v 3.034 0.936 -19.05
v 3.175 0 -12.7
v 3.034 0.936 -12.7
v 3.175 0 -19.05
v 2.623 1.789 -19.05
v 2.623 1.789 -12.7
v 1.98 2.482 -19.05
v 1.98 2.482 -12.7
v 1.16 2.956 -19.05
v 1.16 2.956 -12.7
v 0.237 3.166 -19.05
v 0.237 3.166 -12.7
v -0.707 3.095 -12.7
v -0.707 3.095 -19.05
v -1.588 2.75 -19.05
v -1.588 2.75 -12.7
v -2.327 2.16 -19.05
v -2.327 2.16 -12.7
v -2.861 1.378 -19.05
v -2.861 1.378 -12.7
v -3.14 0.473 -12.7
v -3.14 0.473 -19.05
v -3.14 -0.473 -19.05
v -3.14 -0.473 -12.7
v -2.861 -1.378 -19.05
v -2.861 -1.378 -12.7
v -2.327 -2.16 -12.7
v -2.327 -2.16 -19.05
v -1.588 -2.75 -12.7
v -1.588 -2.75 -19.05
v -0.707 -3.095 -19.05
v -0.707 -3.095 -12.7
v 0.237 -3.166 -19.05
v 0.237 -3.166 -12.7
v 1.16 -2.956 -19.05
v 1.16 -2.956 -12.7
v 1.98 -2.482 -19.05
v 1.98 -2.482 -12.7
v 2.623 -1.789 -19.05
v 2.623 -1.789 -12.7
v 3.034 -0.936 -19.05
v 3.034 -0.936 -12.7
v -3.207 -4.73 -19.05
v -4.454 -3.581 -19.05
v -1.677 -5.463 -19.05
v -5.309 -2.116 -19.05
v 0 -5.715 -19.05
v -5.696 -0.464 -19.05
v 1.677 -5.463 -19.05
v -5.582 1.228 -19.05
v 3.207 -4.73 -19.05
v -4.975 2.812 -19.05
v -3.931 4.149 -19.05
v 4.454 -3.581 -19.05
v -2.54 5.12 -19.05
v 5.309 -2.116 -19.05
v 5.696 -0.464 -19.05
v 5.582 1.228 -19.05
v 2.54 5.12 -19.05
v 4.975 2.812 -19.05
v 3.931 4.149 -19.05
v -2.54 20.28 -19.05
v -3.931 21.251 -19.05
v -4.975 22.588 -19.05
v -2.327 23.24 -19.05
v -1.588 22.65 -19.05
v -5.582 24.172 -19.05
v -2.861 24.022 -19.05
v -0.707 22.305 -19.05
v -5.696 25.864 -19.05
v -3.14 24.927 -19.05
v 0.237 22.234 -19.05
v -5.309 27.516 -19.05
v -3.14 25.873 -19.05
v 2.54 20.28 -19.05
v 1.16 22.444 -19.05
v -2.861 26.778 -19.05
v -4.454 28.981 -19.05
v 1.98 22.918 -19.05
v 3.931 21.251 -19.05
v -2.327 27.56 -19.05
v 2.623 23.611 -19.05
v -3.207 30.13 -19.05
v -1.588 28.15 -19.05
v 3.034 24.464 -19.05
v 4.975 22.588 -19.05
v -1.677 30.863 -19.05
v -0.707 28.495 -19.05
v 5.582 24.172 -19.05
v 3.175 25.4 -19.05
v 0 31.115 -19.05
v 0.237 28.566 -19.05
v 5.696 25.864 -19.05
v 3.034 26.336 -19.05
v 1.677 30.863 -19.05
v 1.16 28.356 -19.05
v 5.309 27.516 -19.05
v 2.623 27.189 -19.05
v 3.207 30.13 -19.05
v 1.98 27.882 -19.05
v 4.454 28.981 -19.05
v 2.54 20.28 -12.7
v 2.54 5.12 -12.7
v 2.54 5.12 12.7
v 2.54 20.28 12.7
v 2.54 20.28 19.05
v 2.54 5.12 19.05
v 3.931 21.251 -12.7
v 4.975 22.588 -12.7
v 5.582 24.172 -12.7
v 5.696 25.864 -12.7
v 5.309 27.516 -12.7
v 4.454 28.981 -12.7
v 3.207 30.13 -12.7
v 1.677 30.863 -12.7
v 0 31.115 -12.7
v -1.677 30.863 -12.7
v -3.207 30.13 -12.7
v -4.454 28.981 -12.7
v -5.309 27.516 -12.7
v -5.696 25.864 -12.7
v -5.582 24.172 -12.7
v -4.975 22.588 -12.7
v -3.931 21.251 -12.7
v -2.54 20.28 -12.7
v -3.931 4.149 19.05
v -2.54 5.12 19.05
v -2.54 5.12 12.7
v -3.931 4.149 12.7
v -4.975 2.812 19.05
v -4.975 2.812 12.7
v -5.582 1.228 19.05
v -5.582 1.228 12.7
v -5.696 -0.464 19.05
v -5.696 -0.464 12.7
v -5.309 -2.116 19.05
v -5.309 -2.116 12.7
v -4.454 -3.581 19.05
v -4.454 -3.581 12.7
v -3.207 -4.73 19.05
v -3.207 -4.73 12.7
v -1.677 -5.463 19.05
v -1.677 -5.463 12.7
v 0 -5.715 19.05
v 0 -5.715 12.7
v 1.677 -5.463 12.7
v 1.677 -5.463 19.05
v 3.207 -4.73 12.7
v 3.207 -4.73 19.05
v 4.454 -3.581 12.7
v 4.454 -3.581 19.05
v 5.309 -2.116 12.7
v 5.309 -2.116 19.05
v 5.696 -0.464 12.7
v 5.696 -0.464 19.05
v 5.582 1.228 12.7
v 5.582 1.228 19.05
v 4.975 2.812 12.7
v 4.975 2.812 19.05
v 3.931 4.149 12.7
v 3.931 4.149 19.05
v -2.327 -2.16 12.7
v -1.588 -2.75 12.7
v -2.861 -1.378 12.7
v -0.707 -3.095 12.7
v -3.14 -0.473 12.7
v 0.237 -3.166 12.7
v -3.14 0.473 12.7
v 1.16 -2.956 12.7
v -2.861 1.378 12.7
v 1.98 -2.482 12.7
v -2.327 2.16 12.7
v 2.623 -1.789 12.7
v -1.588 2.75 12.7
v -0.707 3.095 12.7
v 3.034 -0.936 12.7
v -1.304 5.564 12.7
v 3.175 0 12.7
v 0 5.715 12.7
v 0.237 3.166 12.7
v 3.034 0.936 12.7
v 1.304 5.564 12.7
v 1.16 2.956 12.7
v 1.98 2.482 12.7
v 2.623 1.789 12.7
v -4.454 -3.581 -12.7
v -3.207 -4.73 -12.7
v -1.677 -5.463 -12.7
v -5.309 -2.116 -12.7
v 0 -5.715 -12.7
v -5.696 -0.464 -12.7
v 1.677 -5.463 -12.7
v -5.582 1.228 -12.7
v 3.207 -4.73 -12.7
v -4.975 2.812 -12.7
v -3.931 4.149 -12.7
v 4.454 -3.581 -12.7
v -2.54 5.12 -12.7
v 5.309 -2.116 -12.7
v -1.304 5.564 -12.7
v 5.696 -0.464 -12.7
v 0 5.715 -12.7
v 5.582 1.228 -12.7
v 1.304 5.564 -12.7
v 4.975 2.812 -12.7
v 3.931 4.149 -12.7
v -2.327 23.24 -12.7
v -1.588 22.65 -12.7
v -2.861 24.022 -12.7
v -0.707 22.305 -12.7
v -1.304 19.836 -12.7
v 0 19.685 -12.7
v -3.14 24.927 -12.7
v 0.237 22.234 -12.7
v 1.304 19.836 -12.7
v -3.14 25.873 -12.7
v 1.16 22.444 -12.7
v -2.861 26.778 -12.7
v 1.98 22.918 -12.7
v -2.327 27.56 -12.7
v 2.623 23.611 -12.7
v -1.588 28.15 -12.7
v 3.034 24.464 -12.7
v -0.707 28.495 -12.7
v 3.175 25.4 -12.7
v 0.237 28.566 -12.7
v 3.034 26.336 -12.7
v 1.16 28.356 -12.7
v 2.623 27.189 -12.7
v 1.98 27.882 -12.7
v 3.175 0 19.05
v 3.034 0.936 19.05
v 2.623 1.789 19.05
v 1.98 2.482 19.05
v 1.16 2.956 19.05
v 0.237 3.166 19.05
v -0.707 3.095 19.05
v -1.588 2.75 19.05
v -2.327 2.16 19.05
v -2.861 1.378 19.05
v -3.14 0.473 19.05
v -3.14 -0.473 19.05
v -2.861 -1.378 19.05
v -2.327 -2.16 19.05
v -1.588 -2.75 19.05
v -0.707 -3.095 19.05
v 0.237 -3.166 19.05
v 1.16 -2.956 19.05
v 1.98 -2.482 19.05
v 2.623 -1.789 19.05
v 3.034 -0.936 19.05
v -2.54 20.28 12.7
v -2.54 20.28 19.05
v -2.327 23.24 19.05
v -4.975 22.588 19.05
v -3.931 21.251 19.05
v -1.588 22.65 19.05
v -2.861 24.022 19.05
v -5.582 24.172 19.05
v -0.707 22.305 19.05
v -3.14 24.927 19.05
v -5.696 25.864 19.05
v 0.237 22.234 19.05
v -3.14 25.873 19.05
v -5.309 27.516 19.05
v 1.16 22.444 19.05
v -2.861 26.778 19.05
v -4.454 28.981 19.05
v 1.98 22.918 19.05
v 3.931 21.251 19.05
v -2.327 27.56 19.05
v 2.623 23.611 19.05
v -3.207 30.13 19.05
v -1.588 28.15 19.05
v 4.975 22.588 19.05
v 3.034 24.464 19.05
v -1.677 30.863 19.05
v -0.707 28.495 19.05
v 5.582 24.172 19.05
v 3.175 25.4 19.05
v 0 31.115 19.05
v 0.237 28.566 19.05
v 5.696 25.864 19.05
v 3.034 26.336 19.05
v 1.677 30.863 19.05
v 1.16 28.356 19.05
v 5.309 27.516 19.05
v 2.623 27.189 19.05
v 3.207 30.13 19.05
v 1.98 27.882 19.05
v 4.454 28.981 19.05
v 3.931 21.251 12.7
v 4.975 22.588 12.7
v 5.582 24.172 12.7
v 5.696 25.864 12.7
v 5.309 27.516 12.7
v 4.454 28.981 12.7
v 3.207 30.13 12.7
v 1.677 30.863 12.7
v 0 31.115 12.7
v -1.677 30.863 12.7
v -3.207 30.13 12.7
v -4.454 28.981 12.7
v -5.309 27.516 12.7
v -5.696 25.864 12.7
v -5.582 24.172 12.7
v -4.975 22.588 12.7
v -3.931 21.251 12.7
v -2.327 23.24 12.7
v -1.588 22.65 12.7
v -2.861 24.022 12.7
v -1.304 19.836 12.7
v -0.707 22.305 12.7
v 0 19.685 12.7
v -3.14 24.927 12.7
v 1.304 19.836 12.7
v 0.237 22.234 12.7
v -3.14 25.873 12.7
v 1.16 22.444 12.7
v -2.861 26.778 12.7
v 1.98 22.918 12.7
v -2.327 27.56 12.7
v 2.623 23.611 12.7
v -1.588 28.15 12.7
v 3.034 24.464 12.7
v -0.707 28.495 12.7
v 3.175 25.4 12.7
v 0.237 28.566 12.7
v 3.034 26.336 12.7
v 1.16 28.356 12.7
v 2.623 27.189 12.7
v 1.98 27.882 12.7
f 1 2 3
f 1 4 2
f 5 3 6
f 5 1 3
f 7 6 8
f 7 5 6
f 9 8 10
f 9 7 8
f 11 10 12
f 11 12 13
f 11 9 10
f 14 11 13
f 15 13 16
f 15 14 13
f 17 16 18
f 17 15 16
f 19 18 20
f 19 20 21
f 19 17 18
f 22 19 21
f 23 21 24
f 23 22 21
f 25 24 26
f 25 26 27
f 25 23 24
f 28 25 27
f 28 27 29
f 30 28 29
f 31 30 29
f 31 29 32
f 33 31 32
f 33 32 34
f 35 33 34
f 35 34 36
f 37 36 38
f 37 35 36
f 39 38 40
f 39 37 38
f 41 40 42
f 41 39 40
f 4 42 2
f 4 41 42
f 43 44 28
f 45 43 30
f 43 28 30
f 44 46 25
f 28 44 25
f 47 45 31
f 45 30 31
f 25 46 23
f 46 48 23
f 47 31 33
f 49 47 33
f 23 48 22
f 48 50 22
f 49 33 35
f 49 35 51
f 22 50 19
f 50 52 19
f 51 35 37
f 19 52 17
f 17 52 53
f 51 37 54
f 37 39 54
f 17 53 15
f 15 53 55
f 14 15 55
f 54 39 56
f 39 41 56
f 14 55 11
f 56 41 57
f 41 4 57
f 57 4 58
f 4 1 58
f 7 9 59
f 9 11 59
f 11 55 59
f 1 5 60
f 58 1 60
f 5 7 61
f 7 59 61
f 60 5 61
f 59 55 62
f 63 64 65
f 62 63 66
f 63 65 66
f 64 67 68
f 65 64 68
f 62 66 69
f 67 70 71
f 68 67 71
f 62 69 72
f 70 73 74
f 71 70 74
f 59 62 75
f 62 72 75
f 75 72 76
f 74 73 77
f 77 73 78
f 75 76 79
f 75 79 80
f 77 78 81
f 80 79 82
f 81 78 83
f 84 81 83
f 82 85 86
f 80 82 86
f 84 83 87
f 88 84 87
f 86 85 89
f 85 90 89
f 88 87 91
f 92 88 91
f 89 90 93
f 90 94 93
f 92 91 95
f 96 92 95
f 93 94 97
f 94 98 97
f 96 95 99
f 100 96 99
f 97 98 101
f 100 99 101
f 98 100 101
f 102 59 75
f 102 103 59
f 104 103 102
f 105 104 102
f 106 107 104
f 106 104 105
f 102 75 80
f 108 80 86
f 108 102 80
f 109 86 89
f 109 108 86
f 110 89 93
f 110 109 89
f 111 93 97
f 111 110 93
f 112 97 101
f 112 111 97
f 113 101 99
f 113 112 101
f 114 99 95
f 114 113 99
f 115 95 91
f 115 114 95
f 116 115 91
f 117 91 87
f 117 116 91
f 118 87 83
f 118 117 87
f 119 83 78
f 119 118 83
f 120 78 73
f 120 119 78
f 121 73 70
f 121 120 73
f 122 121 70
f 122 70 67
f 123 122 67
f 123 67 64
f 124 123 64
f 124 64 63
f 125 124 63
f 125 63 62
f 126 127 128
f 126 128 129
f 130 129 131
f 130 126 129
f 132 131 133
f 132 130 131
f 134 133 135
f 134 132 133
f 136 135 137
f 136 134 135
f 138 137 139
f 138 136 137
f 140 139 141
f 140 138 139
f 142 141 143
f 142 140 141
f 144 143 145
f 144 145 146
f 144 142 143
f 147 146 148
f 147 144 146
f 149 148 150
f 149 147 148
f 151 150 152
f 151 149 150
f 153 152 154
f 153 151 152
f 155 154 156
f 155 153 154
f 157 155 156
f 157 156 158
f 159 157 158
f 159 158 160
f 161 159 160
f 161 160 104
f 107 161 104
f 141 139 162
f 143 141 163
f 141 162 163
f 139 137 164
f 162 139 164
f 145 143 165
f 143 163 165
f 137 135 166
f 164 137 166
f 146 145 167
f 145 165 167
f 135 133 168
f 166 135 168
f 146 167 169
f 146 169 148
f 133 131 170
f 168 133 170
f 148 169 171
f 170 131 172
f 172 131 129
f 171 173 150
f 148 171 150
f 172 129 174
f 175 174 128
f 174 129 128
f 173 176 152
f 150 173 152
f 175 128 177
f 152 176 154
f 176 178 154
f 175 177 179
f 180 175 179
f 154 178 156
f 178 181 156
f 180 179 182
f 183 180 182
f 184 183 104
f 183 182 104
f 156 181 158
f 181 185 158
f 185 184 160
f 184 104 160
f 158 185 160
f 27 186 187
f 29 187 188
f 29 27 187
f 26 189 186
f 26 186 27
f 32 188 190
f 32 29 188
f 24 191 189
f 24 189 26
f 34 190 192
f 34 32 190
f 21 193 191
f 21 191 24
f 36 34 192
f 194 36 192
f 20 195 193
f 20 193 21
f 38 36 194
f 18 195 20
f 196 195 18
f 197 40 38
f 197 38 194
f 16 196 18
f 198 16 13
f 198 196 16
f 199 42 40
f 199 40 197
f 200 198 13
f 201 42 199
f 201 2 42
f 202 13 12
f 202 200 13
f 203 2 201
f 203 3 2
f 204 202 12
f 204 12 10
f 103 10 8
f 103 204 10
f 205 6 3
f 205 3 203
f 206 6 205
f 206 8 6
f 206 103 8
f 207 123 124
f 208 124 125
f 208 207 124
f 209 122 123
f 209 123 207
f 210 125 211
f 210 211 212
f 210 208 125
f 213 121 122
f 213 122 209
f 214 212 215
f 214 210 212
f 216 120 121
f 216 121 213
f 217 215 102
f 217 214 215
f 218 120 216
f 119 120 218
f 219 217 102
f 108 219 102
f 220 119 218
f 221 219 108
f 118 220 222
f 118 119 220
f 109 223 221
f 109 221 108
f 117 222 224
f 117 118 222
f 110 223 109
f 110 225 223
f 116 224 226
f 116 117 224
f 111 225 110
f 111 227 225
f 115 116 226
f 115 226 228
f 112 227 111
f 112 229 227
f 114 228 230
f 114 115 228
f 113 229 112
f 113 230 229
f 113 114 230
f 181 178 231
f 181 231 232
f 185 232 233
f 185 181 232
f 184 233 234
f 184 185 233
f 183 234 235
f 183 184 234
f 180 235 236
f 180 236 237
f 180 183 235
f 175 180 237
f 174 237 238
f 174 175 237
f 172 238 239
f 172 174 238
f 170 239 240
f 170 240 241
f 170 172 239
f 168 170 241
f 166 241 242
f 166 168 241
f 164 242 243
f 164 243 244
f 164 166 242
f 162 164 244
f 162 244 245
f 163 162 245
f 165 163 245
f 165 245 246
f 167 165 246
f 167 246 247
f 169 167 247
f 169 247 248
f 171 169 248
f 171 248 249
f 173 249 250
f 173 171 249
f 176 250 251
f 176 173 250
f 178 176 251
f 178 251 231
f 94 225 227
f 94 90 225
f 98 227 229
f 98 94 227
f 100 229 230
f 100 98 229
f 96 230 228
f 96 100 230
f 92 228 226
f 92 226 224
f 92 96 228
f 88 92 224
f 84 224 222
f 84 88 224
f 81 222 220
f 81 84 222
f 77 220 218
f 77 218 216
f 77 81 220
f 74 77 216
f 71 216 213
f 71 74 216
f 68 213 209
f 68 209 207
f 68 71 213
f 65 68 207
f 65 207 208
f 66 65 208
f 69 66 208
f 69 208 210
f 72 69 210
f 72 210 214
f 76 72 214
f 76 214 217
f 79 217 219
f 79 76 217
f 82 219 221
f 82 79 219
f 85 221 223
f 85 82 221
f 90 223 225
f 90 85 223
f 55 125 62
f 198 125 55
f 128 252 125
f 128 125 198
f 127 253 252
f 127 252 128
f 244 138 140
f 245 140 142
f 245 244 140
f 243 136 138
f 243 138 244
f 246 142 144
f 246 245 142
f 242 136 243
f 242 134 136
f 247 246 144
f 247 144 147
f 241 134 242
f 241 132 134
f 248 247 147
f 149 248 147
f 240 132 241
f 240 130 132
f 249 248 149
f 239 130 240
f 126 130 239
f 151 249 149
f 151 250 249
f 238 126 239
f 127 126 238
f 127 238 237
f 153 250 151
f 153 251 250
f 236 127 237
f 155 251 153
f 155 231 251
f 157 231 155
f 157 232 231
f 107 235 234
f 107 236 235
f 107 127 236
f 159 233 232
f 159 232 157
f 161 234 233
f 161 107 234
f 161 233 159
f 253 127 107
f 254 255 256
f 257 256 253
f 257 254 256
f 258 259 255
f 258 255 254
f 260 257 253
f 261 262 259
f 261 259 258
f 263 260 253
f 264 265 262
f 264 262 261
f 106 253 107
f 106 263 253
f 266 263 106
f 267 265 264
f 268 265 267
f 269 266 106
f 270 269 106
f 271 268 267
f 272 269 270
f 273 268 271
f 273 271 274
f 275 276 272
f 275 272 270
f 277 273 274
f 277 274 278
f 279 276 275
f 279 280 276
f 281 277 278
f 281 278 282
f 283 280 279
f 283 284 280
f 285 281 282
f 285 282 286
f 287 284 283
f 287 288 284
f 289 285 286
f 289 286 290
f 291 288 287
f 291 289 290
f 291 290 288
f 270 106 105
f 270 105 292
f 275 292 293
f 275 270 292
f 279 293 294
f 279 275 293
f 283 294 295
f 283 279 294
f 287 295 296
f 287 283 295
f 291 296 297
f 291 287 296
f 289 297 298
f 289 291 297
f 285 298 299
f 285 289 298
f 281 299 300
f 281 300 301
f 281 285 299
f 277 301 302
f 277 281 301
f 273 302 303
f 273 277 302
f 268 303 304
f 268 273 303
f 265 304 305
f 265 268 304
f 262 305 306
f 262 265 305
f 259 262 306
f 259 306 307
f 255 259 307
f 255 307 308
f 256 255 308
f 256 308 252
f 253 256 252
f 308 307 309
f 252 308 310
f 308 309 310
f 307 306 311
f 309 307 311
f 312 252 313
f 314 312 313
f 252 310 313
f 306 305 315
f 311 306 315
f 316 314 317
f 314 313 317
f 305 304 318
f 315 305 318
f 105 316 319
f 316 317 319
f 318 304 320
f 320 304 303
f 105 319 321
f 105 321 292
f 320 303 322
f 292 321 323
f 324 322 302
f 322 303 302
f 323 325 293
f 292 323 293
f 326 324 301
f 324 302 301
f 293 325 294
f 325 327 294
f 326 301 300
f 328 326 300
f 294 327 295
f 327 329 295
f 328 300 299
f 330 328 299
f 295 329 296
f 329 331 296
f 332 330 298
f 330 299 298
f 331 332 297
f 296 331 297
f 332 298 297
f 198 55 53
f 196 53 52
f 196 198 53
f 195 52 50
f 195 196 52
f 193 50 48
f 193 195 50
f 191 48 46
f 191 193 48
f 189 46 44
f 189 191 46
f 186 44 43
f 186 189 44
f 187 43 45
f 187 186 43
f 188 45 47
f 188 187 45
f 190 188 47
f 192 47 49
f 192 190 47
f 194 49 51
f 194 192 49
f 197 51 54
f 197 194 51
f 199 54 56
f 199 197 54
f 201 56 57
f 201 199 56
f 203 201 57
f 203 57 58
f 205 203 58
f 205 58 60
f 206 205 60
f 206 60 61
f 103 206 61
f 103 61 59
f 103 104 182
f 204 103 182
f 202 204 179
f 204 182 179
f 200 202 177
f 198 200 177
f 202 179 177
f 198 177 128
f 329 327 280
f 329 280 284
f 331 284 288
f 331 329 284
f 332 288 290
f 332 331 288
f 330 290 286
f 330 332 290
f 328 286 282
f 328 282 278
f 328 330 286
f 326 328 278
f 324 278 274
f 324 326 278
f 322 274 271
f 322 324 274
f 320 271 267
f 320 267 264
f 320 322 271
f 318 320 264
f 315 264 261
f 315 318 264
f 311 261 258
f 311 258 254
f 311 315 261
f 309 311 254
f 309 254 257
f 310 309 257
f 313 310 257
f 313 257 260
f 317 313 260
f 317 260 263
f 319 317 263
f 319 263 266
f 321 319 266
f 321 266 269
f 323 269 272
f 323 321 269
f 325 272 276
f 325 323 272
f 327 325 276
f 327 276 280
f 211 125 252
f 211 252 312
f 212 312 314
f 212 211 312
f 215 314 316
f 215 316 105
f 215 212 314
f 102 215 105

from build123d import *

# Parameters (mm, degrees)
SKETCH1_R           = 3.175
BOSS_EXTRUDE1_DEPTH = 19.05
SKETCH1_3_R         = 5.715
SKETCH1_3_R_2       = 3.175
CUT_EXTRUDE2_DEPTH  = 12.7


with BuildPart() as part:
    # Sketch1 → Boss-Extrude1 (new, symmetric)
    with BuildSketch(Plane.XY):
        with BuildLine():
            Line((-2.54, 20.28046633), (-2.54, 5.11953367))
            ThreePointArc((-2.54, 5.11953367), (0, -5.715), (2.54, 5.11953367))
            Line((2.54, 5.11953367), (2.54, 20.28046633))
            ThreePointArc((2.54, 20.28046633), (0, 31.115), (-2.54, 20.28046633))
        make_face()
        with Locations((0, 25.4)):
            Circle(SKETCH1_R, mode=Mode.SUBTRACT)
        Circle(SKETCH1_R, mode=Mode.SUBTRACT)
    extrude(amount=BOSS_EXTRUDE1_DEPTH, both=True)

    # Sketch1<3> → Cut-Extrude2 (cut, symmetric)
    # profile 1 of 2: a face of its own
    with BuildSketch(Plane.XY):
        with Locations((0, 25.4)):
            Circle(SKETCH1_3_R)
        with Locations((0, 25.4)):
            Circle(SKETCH1_3_R_2, mode=Mode.SUBTRACT)
    # profile 2 of 2: a face of its own
    with BuildSketch(Plane.XY):
        Circle(SKETCH1_3_R)
        Circle(SKETCH1_3_R_2, mode=Mode.SUBTRACT)
    extrude(amount=CUT_EXTRUDE2_DEPTH, both=True, mode=Mode.SUBTRACT)


solid = part.part
